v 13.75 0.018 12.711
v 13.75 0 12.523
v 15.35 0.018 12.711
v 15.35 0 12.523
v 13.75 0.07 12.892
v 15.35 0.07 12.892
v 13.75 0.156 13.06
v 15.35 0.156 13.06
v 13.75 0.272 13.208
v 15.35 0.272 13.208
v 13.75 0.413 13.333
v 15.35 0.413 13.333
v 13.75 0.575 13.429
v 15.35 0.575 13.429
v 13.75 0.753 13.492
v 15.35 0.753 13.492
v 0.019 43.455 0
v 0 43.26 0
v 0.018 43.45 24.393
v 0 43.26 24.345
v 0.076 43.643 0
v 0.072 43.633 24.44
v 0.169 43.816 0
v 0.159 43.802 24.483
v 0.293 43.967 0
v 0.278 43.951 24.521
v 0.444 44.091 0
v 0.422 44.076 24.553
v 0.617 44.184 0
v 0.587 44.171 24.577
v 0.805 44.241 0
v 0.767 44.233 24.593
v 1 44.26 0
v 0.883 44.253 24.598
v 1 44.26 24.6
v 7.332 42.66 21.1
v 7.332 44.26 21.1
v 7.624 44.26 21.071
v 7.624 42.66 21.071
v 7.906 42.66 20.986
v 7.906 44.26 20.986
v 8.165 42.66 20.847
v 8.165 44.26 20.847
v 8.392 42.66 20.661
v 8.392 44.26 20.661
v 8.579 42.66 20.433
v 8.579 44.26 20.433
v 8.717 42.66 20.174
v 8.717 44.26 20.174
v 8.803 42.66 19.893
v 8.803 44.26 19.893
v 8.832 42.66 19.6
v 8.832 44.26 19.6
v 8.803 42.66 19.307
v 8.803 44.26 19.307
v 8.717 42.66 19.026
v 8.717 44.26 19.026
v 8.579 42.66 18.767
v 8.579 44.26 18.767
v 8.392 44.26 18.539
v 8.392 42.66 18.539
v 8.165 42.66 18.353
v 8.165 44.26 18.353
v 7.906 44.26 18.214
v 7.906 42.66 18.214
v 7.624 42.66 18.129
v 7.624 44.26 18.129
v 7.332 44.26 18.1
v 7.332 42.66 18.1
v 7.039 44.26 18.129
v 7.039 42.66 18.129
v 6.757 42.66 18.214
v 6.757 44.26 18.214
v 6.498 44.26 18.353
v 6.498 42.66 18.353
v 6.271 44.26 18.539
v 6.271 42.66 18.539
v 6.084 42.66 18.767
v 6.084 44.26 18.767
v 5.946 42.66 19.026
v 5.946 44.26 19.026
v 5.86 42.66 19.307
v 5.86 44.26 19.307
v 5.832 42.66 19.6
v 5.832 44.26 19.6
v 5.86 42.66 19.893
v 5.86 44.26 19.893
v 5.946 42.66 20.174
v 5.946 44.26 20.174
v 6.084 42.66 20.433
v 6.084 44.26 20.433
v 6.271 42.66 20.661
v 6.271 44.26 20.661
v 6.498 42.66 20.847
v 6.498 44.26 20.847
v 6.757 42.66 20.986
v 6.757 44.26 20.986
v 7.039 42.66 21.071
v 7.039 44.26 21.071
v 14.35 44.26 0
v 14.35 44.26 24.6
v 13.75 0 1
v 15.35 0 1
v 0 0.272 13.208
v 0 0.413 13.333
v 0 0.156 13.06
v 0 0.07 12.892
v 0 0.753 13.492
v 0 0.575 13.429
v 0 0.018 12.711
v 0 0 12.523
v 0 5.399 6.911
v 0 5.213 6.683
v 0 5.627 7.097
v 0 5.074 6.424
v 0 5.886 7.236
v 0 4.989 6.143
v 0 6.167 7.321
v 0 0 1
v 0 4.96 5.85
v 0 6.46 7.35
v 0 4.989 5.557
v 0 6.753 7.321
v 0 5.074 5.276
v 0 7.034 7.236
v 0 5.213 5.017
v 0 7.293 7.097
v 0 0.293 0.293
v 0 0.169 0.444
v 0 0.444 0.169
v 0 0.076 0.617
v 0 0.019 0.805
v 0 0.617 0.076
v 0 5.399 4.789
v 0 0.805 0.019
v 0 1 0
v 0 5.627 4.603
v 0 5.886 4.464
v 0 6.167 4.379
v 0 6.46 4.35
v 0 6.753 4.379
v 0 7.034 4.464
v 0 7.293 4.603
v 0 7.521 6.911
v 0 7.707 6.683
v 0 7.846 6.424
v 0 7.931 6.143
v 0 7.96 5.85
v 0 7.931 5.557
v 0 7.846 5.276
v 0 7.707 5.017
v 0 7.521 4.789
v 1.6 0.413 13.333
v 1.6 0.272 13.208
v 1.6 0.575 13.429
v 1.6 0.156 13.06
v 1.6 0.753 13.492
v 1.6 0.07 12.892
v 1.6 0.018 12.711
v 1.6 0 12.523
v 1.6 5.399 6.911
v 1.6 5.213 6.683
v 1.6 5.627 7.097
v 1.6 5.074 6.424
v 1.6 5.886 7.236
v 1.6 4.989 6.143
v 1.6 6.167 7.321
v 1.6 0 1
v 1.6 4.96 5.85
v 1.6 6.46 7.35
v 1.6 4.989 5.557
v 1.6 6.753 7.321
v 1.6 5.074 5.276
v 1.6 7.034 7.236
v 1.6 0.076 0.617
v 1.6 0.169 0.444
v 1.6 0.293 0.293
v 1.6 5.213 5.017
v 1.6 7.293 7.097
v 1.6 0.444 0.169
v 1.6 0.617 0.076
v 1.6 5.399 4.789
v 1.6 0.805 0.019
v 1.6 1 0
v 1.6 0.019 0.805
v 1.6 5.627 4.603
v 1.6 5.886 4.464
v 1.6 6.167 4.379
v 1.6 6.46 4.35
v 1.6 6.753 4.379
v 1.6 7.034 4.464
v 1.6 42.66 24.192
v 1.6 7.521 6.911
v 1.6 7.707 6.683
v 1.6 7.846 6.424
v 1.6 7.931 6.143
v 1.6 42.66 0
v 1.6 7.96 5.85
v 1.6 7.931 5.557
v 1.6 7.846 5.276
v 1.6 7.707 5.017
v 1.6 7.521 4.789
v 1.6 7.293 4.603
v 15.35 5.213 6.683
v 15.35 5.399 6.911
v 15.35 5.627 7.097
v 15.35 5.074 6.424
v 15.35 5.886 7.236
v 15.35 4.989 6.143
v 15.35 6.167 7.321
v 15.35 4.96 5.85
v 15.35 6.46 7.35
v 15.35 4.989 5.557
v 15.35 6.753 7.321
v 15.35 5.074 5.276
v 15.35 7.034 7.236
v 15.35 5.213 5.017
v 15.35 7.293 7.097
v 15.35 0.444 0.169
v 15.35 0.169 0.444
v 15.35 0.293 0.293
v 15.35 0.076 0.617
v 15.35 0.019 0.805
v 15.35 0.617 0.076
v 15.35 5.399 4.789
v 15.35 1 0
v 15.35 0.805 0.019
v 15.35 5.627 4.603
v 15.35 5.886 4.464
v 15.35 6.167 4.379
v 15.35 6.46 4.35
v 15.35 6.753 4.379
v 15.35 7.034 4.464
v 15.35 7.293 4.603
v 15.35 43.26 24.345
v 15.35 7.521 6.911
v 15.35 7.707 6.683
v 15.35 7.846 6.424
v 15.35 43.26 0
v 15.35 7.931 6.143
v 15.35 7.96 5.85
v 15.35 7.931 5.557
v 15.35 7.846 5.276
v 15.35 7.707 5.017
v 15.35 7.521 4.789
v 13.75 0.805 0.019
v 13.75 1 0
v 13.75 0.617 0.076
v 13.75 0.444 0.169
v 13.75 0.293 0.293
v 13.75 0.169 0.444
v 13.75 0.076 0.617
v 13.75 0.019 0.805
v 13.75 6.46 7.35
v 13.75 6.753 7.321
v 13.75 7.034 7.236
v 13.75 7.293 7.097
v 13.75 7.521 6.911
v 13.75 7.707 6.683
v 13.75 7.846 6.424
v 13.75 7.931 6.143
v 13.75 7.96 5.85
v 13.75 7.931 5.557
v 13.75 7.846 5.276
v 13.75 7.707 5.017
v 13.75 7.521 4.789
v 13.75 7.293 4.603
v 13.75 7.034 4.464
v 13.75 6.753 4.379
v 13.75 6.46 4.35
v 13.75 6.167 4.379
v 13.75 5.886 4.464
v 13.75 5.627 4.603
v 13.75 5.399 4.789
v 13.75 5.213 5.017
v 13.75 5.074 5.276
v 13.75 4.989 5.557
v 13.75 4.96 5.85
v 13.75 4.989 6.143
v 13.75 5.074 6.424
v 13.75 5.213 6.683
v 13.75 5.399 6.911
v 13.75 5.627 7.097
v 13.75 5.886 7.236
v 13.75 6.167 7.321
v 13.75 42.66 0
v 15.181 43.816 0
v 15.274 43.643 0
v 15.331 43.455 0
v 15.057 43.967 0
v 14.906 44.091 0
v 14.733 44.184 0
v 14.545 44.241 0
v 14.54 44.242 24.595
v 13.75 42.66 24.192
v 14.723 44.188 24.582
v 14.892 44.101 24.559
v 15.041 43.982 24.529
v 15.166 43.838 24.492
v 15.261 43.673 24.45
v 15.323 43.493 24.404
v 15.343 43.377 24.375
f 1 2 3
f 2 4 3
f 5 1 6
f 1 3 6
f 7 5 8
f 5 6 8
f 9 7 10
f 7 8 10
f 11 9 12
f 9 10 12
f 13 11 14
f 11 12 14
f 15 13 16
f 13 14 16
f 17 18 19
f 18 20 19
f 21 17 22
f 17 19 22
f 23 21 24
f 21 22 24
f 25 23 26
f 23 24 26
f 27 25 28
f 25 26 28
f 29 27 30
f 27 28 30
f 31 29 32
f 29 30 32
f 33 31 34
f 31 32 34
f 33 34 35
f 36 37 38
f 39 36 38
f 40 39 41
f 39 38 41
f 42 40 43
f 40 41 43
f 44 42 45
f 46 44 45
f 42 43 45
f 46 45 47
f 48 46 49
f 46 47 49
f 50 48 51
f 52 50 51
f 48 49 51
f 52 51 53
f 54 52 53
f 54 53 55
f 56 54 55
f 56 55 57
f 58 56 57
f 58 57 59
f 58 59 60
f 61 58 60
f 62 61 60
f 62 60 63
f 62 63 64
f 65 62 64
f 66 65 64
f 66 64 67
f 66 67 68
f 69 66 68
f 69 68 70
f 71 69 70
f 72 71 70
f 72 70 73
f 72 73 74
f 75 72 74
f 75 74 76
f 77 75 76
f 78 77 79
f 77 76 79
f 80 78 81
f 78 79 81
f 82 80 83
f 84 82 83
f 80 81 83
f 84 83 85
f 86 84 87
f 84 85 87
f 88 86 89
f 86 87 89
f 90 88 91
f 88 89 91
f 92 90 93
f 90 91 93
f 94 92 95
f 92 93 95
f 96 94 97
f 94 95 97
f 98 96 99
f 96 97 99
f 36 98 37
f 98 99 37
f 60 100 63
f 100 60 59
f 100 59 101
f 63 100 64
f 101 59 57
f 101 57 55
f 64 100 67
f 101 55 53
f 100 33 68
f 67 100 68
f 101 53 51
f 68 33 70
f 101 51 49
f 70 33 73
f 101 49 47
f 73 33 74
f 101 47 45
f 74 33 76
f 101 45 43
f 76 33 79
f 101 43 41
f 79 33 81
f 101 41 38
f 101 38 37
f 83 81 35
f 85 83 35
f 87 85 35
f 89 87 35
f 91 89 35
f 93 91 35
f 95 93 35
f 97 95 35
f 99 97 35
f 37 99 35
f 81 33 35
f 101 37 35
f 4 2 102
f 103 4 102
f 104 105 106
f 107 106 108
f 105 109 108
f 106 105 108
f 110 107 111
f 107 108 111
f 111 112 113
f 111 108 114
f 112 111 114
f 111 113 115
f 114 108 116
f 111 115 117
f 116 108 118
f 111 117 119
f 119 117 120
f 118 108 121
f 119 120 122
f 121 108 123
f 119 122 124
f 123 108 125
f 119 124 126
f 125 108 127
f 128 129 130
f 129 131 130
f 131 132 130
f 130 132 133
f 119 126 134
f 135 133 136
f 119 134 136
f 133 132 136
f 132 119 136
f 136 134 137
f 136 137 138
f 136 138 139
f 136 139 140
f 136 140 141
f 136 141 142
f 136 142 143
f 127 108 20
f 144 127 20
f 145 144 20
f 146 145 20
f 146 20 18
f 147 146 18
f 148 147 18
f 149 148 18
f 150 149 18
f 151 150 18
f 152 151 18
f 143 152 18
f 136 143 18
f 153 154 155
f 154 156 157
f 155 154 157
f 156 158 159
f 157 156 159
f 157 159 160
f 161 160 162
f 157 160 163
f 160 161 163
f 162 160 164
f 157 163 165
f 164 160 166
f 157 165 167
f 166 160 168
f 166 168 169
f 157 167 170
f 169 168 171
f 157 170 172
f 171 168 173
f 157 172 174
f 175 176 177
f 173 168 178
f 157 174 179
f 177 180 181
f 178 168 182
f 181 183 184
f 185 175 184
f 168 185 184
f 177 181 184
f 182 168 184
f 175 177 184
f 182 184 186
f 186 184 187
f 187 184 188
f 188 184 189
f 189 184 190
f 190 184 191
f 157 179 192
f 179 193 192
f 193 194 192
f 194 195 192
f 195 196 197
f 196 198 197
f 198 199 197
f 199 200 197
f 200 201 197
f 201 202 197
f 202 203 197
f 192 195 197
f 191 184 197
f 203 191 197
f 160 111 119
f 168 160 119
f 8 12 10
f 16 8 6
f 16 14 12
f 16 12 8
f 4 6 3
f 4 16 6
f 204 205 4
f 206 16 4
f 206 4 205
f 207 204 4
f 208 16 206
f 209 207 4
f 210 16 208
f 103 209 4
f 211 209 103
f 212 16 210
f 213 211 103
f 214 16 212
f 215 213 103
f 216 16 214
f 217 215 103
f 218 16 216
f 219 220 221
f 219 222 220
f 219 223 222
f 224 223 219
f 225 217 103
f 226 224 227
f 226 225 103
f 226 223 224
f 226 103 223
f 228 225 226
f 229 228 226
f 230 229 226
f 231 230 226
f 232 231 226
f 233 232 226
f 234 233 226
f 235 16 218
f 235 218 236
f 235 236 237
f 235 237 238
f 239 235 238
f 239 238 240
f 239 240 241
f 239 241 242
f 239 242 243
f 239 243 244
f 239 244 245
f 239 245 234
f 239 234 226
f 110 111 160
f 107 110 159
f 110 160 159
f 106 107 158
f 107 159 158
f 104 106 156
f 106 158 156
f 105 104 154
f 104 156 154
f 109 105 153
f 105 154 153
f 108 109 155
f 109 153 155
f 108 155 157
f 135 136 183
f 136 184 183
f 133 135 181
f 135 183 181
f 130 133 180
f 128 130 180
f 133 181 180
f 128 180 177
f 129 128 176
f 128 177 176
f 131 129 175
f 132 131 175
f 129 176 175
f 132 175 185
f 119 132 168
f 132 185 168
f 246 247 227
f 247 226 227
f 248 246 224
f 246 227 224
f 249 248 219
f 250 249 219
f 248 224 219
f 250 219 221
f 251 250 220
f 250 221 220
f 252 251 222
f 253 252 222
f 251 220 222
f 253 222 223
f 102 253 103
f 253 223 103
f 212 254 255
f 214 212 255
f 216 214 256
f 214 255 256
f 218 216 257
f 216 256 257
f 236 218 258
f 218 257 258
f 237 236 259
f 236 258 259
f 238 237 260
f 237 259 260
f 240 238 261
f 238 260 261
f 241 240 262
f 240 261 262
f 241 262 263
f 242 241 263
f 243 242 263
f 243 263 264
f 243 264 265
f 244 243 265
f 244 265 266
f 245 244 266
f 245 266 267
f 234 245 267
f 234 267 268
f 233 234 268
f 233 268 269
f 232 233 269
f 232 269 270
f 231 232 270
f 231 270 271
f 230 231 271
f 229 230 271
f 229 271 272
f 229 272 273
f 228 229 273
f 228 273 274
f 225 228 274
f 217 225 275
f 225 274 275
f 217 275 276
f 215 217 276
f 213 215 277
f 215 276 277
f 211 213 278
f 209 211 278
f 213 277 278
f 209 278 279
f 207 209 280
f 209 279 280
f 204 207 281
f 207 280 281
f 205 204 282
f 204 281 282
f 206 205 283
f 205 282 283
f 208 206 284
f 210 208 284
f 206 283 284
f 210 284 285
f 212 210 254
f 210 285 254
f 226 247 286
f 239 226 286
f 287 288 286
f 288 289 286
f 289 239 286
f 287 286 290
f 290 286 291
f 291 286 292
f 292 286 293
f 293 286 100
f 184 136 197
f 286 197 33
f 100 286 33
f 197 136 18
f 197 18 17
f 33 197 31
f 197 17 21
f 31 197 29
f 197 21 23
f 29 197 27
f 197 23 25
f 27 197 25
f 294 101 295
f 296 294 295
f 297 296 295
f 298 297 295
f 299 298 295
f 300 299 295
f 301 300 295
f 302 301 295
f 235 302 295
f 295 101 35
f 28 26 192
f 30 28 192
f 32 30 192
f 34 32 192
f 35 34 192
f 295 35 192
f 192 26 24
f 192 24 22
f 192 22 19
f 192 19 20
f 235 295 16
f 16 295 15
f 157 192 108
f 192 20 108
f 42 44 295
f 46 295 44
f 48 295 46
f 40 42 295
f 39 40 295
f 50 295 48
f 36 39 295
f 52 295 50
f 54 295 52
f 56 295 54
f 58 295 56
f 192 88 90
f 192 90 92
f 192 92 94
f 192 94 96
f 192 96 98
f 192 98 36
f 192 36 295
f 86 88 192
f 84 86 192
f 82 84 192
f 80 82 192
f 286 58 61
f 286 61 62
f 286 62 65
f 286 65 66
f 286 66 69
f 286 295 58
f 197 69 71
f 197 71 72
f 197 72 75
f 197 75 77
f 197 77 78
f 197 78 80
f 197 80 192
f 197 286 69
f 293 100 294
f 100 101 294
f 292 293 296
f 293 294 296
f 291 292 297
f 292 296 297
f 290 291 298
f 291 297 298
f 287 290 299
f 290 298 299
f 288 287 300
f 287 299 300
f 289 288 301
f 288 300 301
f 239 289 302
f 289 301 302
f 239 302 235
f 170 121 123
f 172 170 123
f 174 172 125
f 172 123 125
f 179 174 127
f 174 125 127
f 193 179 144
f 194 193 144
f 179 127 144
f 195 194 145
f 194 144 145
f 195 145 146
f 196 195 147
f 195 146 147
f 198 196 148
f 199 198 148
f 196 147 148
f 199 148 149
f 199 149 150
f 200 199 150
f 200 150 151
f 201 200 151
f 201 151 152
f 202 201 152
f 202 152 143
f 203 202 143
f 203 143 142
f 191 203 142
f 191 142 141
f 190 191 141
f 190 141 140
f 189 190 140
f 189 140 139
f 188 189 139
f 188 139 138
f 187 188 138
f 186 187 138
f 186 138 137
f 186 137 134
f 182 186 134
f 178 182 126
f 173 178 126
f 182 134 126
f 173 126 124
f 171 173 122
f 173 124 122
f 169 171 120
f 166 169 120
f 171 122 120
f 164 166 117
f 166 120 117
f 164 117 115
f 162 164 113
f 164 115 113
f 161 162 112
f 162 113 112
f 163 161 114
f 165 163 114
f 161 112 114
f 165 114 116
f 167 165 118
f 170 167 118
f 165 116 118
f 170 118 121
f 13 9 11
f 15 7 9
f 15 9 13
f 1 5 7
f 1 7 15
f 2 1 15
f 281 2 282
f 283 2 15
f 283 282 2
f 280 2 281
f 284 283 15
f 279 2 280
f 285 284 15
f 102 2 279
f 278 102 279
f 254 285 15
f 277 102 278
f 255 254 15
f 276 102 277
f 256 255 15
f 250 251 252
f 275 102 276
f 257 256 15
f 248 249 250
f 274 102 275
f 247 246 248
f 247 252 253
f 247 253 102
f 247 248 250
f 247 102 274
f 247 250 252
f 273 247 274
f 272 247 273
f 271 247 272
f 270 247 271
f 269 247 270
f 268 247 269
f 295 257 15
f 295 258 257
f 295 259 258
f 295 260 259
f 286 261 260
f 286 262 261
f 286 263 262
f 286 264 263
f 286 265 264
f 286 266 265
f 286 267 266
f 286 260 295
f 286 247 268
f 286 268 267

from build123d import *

# Parameters (mm, degrees)
BOSS_EXTRU_1_DEPTH      = 15.35
ESQUISSE2_W             = 12.15
ESQUISSE2_H             = 42.66
ENL_V_MAT_EXTRU_1_DEPTH = 53.912475845
CONG_1_R                = 1
ESQUISSE3_R             = 1.5
ENL_V_MAT_EXTRU_2_DEPTH = 53.912475845
ESQUISSE4_R             = 1.5
ENL_V_MAT_EXTRU_3_DEPTH = 53.912475845


with BuildPart() as part:
    # Esquisse1 → Boss.-Extru.1 (new body)
    with BuildSketch(Plane(origin=(0, 0, 0), x_dir=(0, 0, -1), z_dir=(1, 0, 0))):
        Polygon((0, 0), (0, 44.26), (-24.6, 44.26), (-13.3, 0), align=None)
    extrude(amount=BOSS_EXTRU_1_DEPTH)

    # Esquisse2 → Enlèv. mat.-Extru.1 (cut, through all)
    with BuildSketch(Plane(origin=(0, 0, 0), x_dir=(-1, 0, 0), z_dir=(0, 0, -1))):
        with Locations((-7.675, 21.33)):
            Rectangle(ESQUISSE2_W, ESQUISSE2_H)
    extrude(amount=-ENL_V_MAT_EXTRU_1_DEPTH, mode=Mode.SUBTRACT)

    # Congé1
    cong_1_edges = [part.edges().sort_by_distance(p)[0] for p in [
        (15.35, 44.26, 12.3),
        (0.8, 0, 13.3),
        (0.8, 0, 0),
        (0, 44.26, 12.3),
        (14.55, 0, 13.3),
        (14.55, 0, 0),
    ]]
    fillet(cong_1_edges, radius=CONG_1_R)

    # Esquisse3 → Enlèv. mat.-Extru.2 (cut, through all)
    with BuildSketch(Plane.ZY):
        with Locations((5.85, 6.46)):
            Circle(ESQUISSE3_R)
    extrude(amount=-ENL_V_MAT_EXTRU_2_DEPTH, mode=Mode.SUBTRACT)

    # Esquisse4 → Enlèv. mat.-Extru.3 (cut, through all)
    with BuildSketch(Plane(origin=(0, 44.26, 0), x_dir=(1, 0, 0), z_dir=(0, 1, 0))):
        with Locations(Location((7.331518895, -19.6, 0), (0, 0, 270))):
            Circle(ESQUISSE4_R)
    extrude(amount=-ENL_V_MAT_EXTRU_3_DEPTH, mode=Mode.SUBTRACT)


solid = part.part
